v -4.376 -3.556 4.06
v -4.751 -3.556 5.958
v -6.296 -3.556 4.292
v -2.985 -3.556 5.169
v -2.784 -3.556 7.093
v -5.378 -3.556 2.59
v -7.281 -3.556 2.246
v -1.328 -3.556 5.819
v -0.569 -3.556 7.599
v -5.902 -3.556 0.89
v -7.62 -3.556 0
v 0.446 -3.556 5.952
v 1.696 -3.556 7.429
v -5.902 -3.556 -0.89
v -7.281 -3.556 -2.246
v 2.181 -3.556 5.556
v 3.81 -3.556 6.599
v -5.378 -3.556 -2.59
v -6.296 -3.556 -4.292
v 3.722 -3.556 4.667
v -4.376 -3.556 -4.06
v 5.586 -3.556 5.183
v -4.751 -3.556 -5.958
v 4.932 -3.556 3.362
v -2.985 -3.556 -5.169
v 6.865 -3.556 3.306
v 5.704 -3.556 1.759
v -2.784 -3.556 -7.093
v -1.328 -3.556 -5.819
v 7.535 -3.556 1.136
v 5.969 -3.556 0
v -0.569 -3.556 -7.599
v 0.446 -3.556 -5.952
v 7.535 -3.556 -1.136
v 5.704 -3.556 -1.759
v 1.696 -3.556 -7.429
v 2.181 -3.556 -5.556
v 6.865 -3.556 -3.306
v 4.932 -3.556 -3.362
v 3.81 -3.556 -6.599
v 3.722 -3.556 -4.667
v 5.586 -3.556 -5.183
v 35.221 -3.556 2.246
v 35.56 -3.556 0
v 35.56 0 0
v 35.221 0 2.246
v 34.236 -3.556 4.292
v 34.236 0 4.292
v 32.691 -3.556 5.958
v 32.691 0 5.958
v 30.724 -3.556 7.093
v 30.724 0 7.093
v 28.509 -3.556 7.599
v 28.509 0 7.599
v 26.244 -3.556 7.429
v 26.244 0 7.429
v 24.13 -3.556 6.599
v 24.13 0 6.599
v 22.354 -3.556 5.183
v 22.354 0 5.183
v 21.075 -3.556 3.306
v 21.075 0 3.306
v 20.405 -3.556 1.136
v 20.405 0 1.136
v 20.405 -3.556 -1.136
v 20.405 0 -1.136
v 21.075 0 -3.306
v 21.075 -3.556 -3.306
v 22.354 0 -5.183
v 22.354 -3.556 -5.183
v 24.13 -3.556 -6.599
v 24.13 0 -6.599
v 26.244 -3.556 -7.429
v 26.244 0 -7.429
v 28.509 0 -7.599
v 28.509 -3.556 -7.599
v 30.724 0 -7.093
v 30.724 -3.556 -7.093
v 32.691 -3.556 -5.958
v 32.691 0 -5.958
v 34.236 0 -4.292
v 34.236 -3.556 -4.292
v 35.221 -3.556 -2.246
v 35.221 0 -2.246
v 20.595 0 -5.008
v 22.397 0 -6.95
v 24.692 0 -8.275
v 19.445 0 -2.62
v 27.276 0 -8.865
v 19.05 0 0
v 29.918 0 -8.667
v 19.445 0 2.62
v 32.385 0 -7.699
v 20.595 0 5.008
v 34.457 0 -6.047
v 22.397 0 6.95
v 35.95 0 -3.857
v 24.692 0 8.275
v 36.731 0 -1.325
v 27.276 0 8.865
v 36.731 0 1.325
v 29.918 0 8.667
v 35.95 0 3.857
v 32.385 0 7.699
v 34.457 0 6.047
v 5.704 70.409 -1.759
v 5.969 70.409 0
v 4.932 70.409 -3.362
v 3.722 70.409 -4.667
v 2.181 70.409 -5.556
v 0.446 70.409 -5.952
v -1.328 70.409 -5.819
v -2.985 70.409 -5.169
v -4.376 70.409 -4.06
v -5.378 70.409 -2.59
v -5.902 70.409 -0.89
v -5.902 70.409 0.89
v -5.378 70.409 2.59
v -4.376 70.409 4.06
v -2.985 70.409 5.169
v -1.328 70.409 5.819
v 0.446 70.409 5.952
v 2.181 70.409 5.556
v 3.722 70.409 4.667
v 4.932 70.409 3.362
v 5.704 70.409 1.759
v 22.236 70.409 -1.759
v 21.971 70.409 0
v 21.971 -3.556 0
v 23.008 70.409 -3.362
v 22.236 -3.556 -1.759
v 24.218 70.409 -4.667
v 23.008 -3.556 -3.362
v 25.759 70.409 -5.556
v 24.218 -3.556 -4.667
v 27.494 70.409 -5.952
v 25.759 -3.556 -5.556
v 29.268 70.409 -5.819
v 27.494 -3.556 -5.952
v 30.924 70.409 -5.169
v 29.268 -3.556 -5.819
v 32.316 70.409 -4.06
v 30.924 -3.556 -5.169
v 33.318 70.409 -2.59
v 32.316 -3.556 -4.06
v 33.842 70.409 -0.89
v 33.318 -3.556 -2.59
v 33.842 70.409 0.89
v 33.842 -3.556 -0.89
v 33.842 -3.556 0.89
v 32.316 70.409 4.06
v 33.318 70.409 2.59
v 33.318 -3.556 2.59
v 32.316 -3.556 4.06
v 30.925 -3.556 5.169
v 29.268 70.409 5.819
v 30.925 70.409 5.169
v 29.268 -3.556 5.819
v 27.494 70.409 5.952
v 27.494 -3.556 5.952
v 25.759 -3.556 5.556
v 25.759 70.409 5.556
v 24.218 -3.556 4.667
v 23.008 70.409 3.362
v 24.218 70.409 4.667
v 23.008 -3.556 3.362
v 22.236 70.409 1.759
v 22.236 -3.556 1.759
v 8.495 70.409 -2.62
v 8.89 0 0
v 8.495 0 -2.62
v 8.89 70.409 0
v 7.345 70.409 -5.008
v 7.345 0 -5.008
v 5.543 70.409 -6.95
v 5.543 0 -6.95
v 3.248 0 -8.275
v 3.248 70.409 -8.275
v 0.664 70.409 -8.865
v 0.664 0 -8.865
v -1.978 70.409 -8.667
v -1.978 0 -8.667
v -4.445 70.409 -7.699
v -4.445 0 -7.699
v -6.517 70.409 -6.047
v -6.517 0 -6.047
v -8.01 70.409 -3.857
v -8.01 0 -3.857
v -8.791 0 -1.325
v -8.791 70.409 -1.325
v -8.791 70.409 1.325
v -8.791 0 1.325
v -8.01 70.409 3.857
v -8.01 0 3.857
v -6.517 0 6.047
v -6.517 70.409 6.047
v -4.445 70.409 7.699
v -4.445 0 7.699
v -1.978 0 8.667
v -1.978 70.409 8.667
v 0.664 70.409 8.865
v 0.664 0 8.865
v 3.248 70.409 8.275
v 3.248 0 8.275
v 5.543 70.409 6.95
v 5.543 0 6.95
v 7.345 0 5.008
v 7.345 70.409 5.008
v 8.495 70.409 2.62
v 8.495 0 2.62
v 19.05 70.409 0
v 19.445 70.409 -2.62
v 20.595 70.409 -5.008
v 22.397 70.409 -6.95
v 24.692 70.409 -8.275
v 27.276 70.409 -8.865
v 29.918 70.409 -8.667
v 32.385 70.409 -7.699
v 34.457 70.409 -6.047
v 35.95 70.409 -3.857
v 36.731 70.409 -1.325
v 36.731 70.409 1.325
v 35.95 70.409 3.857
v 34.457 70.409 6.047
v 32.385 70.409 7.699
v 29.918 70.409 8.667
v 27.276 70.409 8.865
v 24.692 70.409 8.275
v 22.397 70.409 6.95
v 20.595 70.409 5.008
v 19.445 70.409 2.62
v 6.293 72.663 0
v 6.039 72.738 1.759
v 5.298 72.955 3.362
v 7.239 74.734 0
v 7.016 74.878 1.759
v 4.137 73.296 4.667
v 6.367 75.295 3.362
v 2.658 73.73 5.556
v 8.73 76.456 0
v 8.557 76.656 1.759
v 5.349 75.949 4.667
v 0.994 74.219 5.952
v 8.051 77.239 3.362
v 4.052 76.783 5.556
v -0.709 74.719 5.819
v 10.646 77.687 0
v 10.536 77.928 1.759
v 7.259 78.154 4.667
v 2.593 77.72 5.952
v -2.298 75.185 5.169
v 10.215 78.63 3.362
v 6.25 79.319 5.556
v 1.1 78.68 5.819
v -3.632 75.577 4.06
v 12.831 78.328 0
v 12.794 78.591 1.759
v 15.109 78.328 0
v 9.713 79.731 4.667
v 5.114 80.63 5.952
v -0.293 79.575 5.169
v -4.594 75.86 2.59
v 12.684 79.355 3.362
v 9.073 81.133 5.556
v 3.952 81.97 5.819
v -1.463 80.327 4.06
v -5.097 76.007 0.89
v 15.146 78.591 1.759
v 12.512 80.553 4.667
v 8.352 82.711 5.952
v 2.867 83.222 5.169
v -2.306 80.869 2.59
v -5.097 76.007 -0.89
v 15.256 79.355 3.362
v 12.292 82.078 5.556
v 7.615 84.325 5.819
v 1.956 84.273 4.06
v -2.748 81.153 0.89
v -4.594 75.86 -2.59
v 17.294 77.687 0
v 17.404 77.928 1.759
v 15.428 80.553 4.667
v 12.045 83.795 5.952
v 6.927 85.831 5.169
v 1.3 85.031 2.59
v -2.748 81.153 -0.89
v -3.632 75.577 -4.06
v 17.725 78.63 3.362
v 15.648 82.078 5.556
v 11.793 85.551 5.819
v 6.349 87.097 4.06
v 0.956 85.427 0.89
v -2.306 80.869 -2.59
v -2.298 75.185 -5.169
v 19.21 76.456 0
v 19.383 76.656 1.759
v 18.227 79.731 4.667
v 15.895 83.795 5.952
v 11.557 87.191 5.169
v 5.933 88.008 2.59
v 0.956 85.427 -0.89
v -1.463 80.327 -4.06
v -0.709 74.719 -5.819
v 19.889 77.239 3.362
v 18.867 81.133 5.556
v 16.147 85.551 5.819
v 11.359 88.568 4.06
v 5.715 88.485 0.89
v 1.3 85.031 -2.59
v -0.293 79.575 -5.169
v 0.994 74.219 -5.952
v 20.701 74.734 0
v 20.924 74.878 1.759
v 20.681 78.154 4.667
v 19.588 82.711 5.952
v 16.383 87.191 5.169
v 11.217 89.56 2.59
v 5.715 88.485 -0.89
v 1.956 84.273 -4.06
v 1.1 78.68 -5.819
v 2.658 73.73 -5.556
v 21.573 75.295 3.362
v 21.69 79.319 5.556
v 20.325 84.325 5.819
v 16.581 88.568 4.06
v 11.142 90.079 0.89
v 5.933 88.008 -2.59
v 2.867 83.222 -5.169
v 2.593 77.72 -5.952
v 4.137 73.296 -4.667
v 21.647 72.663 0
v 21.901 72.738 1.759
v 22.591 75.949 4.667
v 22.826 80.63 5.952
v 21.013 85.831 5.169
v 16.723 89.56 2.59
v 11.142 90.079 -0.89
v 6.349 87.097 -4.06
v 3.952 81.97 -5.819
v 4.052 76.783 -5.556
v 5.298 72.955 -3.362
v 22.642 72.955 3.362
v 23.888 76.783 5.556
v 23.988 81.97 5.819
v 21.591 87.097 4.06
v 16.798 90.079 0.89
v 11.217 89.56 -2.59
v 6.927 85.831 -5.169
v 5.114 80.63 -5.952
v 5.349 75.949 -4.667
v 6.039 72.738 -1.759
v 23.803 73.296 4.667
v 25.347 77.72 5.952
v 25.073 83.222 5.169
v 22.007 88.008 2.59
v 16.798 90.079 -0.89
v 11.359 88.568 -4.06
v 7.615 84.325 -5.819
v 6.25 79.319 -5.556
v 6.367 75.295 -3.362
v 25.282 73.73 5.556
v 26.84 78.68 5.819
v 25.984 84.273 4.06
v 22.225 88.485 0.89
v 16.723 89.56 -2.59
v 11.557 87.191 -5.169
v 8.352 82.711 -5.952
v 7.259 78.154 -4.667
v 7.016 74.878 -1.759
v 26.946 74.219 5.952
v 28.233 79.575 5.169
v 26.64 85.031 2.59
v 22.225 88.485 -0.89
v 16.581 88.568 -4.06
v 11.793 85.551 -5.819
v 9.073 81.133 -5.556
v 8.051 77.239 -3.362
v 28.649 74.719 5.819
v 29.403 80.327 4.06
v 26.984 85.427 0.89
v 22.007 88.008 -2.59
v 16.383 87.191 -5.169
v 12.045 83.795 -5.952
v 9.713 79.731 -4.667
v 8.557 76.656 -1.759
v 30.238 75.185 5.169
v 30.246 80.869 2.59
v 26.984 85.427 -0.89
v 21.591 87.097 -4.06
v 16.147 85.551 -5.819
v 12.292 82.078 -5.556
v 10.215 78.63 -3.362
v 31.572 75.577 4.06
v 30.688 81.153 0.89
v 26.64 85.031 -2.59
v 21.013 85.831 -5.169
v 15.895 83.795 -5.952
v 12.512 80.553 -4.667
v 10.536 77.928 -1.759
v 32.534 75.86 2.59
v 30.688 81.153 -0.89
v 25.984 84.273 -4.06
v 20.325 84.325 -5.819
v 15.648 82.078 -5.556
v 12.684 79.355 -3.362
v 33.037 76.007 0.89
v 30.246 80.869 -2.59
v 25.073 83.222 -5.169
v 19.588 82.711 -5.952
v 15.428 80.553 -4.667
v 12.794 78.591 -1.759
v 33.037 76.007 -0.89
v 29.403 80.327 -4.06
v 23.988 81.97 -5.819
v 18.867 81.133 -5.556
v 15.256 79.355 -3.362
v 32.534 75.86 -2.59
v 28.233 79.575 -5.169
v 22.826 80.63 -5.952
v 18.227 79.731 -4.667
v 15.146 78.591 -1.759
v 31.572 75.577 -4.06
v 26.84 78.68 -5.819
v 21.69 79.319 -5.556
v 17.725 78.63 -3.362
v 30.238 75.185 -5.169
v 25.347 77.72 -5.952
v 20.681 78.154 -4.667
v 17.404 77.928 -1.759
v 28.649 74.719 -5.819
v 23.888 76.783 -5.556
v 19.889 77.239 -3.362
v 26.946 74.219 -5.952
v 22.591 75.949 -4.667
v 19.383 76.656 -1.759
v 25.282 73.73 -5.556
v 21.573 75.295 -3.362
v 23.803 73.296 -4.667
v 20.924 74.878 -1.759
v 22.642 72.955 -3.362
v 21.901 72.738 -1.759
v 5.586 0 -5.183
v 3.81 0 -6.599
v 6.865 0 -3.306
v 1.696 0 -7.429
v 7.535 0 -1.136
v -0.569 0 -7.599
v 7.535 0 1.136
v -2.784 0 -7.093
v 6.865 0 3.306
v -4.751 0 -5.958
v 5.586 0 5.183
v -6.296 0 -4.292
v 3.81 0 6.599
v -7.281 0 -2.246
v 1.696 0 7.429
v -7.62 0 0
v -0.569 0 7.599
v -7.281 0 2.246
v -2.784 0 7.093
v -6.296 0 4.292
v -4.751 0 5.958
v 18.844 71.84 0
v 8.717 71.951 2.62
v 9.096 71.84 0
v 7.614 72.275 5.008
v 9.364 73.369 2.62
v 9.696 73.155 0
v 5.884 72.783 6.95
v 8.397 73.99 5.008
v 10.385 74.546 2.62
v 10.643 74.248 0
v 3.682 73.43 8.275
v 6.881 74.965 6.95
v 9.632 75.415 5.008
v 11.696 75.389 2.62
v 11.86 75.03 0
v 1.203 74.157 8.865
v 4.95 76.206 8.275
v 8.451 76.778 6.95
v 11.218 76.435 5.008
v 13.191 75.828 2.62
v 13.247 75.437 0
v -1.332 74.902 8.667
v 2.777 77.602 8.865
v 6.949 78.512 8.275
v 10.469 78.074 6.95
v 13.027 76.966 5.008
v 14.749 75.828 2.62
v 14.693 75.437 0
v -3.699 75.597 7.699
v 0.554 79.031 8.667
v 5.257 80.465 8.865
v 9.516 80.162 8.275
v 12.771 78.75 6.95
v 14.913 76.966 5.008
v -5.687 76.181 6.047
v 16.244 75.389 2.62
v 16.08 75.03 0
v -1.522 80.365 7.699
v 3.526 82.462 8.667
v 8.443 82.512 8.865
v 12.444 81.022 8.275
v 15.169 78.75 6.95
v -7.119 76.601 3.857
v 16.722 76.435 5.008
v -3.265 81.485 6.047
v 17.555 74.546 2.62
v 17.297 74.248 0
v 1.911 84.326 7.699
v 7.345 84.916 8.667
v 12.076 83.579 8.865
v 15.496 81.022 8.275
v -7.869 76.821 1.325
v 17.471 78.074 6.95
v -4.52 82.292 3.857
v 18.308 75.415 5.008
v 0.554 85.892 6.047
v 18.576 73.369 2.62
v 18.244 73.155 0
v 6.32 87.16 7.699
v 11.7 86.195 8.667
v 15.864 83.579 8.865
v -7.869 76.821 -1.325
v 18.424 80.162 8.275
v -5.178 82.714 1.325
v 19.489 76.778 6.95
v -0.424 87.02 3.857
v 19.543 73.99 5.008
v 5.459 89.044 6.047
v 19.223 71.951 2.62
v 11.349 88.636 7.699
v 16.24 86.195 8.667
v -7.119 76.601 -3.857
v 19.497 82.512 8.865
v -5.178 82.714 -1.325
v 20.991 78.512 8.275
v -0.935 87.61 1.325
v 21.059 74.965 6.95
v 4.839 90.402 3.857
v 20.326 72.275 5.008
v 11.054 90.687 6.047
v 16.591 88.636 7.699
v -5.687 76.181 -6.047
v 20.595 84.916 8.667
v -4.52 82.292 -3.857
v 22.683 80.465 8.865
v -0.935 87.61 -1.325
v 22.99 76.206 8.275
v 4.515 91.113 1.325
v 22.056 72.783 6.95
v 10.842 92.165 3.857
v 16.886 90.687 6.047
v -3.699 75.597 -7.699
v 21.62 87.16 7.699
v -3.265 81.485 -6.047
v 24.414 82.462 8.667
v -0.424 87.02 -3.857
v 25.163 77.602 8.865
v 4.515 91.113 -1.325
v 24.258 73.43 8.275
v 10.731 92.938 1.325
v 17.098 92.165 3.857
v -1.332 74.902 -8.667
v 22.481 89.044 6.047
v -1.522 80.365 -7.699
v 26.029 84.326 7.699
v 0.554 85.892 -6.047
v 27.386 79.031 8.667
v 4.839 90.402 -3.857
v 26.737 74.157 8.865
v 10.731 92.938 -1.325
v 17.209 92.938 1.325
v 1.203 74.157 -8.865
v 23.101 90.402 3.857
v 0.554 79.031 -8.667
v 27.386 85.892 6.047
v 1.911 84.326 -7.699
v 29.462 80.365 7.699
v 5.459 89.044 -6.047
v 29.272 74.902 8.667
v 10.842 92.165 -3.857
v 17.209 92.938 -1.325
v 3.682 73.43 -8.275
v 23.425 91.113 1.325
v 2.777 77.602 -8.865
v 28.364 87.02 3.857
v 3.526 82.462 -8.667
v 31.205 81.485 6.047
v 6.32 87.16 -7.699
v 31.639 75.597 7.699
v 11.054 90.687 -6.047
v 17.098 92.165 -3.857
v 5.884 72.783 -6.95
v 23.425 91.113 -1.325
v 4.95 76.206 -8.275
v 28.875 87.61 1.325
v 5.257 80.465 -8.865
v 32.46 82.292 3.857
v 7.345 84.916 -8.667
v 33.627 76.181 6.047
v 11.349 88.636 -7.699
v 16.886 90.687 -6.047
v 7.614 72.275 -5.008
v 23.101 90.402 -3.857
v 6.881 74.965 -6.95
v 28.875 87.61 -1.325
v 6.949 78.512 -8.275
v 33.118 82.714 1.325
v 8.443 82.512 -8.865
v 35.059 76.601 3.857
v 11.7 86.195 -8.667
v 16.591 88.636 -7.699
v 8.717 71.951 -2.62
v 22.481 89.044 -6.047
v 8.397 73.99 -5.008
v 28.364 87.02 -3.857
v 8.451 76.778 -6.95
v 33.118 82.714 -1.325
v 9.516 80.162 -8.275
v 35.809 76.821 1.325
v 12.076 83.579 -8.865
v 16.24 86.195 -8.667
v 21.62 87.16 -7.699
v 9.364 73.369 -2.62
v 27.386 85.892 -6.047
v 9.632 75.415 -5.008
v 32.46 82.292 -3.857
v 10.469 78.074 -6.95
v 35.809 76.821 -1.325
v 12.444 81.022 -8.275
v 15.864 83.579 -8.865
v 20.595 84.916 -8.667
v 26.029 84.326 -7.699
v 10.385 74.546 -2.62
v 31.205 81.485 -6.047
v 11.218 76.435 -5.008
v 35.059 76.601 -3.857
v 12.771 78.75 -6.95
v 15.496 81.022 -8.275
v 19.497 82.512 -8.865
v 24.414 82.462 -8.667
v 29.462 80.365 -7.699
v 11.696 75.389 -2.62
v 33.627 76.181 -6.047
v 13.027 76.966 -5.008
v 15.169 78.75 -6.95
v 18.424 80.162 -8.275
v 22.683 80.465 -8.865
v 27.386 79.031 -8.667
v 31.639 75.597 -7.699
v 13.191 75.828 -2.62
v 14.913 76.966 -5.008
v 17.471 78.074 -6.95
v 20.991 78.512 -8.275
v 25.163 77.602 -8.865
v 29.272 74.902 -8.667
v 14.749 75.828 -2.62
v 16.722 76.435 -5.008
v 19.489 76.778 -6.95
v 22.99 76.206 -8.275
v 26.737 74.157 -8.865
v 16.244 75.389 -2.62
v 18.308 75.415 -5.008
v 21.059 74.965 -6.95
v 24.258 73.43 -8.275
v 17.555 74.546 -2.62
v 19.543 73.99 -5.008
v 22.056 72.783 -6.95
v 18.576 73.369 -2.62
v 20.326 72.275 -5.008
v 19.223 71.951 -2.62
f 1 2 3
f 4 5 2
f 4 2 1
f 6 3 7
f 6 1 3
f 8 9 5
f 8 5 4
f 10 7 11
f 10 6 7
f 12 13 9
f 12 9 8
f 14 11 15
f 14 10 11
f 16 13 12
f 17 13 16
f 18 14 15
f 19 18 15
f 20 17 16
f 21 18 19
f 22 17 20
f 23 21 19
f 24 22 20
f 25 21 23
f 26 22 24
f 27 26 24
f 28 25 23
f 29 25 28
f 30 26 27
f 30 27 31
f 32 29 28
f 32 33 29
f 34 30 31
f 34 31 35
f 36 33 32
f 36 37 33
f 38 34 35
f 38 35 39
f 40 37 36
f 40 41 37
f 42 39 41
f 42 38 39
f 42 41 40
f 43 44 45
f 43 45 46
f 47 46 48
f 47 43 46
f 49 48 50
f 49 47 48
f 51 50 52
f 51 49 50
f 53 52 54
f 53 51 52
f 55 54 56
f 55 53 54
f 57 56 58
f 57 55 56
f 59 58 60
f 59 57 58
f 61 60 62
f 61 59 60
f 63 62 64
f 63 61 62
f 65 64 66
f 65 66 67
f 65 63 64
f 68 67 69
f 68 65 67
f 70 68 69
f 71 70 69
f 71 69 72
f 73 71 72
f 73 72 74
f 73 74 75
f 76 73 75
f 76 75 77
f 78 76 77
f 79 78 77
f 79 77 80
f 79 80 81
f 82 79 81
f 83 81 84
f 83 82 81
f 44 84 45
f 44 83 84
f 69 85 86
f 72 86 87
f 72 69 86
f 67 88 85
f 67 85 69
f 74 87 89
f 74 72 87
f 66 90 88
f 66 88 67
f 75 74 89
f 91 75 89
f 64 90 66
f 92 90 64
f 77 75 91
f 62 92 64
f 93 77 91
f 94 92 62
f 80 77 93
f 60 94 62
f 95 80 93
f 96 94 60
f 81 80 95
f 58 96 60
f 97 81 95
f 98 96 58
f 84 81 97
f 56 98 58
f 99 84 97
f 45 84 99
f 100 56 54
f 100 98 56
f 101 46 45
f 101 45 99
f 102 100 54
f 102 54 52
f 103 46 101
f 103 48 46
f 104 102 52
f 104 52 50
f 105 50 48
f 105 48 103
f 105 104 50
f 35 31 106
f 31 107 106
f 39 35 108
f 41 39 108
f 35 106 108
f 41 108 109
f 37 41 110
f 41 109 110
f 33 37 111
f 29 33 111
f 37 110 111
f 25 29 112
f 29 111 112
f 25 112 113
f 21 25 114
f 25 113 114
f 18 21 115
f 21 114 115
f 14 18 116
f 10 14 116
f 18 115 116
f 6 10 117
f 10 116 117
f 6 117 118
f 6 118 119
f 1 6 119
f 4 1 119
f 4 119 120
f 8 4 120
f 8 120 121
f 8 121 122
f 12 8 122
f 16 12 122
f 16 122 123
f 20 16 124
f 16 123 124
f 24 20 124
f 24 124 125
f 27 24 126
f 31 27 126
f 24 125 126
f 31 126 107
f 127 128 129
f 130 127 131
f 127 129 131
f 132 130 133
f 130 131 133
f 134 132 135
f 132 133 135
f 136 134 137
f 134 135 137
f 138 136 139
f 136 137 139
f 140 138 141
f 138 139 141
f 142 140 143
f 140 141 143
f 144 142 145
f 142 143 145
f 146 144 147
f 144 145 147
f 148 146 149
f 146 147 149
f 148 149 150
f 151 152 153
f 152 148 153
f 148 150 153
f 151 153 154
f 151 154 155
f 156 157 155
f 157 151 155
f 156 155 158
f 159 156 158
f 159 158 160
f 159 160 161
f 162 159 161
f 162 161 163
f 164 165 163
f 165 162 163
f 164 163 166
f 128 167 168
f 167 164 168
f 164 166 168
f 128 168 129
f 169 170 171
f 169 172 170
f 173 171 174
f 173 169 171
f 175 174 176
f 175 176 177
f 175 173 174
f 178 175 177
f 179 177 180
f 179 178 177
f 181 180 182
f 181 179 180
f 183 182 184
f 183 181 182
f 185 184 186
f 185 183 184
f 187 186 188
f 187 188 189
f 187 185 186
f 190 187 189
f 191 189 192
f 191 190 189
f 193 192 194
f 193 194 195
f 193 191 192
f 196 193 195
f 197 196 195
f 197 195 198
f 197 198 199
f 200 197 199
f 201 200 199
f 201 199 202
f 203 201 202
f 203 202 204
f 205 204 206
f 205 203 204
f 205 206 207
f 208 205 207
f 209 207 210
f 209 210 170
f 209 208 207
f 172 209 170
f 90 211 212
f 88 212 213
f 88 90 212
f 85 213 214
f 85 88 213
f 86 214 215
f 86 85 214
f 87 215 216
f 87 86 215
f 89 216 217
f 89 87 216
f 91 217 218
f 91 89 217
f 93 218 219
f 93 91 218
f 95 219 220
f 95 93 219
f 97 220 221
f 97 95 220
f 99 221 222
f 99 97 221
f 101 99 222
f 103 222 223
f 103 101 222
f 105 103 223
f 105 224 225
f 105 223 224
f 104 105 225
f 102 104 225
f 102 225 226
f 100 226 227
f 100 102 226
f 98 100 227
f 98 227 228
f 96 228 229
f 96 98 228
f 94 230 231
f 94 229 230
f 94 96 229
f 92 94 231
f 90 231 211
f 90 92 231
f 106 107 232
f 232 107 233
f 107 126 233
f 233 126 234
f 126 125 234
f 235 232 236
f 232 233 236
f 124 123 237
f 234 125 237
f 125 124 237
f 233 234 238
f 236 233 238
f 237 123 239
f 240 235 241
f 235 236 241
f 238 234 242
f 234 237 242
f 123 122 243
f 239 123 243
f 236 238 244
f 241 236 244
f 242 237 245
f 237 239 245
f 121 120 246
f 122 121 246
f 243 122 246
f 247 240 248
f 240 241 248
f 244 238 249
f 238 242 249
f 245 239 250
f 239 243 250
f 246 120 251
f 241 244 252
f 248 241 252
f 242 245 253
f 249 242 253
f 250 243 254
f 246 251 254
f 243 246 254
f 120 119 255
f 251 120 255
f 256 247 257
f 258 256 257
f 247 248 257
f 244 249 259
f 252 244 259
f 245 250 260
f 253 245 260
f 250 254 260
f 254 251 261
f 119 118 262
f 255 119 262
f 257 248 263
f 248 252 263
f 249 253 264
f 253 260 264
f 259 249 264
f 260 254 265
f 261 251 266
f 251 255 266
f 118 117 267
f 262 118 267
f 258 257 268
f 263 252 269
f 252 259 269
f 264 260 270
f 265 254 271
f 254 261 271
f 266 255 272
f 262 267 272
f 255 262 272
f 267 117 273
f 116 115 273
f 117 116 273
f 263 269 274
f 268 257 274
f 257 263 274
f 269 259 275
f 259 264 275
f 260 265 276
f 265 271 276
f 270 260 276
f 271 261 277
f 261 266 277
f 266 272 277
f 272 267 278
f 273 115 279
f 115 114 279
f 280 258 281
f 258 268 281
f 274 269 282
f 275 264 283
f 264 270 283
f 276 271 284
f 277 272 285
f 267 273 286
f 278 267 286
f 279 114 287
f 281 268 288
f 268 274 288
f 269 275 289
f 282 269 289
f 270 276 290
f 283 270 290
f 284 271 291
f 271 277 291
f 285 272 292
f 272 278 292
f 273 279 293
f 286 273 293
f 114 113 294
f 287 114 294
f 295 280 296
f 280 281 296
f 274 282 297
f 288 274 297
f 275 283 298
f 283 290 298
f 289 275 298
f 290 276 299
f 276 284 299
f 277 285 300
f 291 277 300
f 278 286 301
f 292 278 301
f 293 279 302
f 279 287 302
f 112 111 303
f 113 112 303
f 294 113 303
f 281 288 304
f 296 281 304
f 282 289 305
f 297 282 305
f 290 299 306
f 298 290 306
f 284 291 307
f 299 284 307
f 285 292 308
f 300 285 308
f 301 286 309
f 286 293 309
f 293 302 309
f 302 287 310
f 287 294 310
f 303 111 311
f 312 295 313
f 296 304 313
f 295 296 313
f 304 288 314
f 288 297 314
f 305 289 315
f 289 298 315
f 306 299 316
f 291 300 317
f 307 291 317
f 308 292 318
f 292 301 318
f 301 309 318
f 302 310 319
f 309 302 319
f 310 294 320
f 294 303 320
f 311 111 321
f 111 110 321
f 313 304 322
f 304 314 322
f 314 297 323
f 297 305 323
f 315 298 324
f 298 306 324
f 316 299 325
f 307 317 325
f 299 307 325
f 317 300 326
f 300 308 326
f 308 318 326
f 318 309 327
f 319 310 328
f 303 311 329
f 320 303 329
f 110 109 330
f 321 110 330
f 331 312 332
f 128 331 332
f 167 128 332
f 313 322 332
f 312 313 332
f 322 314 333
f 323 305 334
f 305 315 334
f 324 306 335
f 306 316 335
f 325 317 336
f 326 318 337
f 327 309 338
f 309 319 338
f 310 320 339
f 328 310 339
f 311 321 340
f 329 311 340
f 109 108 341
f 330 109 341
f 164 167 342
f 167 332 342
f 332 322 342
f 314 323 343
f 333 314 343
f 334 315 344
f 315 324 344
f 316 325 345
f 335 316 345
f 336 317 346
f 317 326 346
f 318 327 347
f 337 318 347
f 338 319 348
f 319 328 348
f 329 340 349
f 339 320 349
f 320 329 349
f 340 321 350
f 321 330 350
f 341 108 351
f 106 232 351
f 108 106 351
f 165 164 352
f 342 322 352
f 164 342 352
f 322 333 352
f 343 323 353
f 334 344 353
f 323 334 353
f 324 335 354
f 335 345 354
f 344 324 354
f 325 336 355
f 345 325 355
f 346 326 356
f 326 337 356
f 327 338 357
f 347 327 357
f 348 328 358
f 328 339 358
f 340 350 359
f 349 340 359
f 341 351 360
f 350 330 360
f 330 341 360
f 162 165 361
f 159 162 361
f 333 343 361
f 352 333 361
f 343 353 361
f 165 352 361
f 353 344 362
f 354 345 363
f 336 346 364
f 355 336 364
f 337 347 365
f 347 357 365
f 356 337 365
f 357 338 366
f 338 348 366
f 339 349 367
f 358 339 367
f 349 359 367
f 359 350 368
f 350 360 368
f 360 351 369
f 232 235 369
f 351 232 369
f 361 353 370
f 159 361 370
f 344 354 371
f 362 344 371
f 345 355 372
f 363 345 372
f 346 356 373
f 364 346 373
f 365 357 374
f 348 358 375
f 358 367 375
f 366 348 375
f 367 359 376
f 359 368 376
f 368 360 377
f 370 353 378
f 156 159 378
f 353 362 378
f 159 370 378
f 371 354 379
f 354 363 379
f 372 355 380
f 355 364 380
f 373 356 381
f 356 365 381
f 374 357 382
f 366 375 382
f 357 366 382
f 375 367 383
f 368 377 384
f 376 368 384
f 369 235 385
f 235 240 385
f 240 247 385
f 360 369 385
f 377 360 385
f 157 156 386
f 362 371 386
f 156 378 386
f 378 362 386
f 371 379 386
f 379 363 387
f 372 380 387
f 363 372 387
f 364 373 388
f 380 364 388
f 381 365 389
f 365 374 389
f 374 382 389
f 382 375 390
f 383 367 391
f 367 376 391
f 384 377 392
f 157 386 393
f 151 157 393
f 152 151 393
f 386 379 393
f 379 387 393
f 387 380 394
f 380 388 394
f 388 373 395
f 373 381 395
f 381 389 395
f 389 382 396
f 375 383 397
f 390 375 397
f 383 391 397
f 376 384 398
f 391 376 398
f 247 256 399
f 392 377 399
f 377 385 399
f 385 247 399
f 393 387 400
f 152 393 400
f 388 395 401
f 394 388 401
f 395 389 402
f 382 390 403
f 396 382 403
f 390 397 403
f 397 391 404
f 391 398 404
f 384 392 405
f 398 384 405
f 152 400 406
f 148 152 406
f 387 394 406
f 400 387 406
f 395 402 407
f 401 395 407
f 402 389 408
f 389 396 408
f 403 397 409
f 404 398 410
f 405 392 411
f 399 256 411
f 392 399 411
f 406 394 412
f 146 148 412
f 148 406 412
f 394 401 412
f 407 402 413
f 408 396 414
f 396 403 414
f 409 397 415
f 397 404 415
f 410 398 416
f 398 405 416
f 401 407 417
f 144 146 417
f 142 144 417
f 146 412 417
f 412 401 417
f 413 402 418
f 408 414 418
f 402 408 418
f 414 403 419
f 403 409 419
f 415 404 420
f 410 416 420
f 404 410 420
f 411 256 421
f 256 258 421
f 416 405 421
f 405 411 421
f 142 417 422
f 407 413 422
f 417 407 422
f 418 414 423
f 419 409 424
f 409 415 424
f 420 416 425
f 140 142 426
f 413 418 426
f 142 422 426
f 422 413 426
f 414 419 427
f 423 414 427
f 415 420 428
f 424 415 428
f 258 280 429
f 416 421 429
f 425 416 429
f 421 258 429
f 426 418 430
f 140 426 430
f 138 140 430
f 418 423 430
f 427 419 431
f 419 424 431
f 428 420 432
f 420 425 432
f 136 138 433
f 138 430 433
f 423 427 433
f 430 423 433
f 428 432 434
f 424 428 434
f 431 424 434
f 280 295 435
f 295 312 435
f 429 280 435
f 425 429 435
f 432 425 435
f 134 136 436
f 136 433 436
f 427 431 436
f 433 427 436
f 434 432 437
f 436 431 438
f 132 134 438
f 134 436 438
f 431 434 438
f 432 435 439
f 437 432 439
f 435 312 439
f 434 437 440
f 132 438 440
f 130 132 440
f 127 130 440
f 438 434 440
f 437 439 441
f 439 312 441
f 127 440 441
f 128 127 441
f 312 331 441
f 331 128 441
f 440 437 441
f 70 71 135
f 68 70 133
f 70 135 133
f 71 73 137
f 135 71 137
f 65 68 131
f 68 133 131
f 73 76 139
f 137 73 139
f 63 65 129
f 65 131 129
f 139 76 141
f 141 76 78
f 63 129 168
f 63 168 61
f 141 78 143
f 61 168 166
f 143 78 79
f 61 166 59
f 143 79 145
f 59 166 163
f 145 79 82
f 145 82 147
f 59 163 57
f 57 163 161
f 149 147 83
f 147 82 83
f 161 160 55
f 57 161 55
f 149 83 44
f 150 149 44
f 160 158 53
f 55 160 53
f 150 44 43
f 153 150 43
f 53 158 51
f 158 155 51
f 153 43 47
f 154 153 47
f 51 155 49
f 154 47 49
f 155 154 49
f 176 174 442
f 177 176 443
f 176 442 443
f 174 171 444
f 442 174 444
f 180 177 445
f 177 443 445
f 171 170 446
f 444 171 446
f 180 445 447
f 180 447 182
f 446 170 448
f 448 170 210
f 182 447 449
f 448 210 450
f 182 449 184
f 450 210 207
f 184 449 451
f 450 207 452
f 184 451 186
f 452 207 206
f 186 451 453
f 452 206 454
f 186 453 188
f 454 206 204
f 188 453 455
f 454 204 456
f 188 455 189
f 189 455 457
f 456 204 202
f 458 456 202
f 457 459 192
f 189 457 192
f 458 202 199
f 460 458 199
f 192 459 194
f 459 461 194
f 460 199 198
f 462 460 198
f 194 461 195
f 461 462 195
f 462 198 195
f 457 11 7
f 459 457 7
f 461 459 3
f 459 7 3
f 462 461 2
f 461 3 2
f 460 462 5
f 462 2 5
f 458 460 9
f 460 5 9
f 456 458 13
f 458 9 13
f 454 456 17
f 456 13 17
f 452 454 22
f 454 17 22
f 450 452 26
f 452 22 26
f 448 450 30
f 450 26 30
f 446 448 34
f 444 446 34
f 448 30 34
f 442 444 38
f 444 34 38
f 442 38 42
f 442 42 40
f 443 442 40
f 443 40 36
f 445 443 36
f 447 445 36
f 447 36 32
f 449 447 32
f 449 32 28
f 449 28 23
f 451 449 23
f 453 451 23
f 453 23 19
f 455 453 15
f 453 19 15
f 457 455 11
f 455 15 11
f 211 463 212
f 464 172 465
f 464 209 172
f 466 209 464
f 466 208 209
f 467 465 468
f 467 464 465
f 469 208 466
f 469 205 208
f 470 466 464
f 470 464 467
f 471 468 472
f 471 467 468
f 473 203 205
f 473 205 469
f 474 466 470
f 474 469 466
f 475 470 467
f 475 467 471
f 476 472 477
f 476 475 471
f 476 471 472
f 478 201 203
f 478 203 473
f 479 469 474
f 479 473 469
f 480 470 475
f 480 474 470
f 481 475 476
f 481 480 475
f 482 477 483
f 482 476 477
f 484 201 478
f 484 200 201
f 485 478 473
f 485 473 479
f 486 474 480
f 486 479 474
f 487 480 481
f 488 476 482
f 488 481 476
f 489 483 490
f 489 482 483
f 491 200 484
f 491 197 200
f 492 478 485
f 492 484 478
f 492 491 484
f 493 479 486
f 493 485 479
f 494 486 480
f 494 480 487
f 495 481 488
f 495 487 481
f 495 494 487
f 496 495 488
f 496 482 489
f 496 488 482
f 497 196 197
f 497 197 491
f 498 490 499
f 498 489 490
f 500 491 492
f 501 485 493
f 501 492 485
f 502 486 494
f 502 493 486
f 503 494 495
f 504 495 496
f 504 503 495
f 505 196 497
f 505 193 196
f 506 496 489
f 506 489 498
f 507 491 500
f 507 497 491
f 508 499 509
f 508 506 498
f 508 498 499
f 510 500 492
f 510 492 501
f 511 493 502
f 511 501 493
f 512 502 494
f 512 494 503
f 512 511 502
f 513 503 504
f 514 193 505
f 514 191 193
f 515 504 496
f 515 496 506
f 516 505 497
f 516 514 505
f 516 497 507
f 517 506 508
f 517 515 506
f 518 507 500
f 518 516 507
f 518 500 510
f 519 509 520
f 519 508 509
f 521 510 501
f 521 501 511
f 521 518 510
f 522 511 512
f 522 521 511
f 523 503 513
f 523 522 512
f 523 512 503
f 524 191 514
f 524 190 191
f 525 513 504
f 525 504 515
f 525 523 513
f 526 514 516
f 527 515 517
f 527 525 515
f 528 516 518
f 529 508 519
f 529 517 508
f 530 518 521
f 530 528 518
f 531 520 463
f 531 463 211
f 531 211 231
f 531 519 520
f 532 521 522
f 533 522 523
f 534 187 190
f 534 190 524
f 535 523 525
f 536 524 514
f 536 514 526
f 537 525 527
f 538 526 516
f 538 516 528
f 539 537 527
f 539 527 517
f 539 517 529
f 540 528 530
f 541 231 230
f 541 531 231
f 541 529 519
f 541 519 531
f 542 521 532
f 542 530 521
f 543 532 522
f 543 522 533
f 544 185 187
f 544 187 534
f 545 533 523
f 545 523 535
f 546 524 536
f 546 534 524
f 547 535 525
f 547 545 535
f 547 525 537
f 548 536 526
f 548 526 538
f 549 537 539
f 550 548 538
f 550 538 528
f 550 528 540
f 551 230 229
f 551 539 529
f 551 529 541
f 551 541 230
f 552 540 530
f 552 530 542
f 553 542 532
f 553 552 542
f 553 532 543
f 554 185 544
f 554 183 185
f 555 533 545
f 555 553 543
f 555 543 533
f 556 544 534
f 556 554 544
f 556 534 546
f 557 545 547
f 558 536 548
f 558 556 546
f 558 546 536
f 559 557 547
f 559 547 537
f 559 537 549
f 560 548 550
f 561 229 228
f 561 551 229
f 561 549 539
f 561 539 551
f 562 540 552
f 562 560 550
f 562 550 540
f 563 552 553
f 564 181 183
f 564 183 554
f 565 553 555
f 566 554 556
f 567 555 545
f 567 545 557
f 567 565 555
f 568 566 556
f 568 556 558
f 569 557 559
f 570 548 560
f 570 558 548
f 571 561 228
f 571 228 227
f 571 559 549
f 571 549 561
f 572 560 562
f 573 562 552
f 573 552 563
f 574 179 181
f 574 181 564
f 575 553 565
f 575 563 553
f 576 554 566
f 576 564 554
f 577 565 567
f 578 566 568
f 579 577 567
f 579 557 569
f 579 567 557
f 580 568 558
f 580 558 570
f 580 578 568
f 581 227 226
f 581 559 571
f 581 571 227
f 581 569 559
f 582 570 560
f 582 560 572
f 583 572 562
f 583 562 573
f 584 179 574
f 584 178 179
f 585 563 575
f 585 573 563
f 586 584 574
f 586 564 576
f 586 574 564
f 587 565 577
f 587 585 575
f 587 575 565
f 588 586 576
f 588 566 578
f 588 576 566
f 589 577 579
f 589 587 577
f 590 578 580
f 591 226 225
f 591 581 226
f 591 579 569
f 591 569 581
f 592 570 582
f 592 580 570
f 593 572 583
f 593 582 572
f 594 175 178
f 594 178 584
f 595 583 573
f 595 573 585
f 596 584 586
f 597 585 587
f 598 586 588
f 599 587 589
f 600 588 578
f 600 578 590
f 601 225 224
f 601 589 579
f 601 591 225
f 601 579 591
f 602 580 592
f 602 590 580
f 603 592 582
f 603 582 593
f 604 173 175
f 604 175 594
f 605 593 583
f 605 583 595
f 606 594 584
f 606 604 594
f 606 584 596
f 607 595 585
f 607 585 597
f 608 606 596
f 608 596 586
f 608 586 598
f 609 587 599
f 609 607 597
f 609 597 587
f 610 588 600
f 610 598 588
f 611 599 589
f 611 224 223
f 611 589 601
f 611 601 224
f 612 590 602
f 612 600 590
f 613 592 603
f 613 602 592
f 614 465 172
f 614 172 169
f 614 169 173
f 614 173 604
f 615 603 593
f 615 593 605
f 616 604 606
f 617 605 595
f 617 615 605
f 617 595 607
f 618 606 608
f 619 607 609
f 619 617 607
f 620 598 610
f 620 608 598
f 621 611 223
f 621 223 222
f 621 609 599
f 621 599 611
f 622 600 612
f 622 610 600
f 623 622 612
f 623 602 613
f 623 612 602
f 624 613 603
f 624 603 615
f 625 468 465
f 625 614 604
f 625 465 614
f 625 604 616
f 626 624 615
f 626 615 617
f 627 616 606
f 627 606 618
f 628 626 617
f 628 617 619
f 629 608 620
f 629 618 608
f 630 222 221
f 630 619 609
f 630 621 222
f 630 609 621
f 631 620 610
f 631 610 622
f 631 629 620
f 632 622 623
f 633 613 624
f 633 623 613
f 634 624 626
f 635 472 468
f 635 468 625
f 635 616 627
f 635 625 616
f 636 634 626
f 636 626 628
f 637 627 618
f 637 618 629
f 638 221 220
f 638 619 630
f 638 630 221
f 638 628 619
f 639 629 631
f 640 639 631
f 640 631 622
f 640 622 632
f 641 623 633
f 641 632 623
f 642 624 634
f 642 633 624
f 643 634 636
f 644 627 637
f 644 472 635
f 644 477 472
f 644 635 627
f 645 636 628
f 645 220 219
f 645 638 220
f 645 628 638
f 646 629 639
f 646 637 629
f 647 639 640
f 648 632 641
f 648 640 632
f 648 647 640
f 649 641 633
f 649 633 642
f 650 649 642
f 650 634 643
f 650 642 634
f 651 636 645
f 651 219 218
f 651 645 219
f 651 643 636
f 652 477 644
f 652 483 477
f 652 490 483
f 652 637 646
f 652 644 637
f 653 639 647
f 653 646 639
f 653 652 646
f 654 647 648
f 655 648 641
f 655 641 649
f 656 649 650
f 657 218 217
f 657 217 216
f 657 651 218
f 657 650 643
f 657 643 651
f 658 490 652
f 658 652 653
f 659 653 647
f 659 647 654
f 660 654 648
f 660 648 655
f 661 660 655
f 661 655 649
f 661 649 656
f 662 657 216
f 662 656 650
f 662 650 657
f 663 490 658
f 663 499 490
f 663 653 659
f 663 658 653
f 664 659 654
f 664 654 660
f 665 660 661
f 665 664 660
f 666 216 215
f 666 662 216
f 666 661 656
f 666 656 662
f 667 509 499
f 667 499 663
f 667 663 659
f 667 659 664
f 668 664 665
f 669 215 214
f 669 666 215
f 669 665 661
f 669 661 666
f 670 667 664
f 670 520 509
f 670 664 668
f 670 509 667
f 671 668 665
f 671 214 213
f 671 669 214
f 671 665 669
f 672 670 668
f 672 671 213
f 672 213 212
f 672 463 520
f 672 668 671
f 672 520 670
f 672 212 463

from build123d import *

# Parameters (mm, degrees)
F1_R     = 8.89
F1_R_2   = 5.969
F3_DEPTH = 3.556
F5_R     = 8.89
F5_R_2   = 7.62
F7_DEPTH = 3.556


# Not quite as in the source:
# - a feature of the source that left no trace in its solid (it failed there, or was rolled back) is left out
# - a pattern or mirror of a feature is missing from the dataset's text; its kind, count and spacing are read off the source's solid


with BuildPart() as f2:
    # F2: sweep along a path in F0
    with BuildLine(Plane.XY) as f2_path:
        Line((0, 0), (0, 70.4088))
        ThreePointArc((0, 70.4088), (13.97, 84.3788), (27.94, 70.4088))
        Line((27.94, 70.4088), (27.94, 0))
        Line((27.94, 0), (27.94, -3.556))
    # F1 (on Front) → F2 (sweep)
    with BuildSketch(Plane.XZ):
        Circle(F1_R)
        Circle(F1_R_2, mode=Mode.SUBTRACT)
    sweep(path=f2_path.line)

    # F3 (add): a face of the model
    f3_faces = [f2.faces().sort_by_distance(p)[0] for p in [
        (-8.6385528286, 0, 0),
    ]]
    extrude(f3_faces, amount=F3_DEPTH)

    # F5 (on face) → F7 (cut)
    with BuildSketch(Plane.XZ.offset(3.556)):
        with Locations((27.94, 0)):
            Circle(F5_R)
        with Locations((27.94, 0)):
            Circle(F5_R_2, mode=Mode.SUBTRACT)
    f7 = extrude(amount=-F7_DEPTH, mode=Mode.SUBTRACT)

    # F7_copies: F7 across plane
    add(f7.mirror(Plane(origin=(13.97, 0, 0), x_dir=(0, 0, -1), z_dir=(-1, 0, 0))), mode=Mode.SUBTRACT)


solid = f2.part
